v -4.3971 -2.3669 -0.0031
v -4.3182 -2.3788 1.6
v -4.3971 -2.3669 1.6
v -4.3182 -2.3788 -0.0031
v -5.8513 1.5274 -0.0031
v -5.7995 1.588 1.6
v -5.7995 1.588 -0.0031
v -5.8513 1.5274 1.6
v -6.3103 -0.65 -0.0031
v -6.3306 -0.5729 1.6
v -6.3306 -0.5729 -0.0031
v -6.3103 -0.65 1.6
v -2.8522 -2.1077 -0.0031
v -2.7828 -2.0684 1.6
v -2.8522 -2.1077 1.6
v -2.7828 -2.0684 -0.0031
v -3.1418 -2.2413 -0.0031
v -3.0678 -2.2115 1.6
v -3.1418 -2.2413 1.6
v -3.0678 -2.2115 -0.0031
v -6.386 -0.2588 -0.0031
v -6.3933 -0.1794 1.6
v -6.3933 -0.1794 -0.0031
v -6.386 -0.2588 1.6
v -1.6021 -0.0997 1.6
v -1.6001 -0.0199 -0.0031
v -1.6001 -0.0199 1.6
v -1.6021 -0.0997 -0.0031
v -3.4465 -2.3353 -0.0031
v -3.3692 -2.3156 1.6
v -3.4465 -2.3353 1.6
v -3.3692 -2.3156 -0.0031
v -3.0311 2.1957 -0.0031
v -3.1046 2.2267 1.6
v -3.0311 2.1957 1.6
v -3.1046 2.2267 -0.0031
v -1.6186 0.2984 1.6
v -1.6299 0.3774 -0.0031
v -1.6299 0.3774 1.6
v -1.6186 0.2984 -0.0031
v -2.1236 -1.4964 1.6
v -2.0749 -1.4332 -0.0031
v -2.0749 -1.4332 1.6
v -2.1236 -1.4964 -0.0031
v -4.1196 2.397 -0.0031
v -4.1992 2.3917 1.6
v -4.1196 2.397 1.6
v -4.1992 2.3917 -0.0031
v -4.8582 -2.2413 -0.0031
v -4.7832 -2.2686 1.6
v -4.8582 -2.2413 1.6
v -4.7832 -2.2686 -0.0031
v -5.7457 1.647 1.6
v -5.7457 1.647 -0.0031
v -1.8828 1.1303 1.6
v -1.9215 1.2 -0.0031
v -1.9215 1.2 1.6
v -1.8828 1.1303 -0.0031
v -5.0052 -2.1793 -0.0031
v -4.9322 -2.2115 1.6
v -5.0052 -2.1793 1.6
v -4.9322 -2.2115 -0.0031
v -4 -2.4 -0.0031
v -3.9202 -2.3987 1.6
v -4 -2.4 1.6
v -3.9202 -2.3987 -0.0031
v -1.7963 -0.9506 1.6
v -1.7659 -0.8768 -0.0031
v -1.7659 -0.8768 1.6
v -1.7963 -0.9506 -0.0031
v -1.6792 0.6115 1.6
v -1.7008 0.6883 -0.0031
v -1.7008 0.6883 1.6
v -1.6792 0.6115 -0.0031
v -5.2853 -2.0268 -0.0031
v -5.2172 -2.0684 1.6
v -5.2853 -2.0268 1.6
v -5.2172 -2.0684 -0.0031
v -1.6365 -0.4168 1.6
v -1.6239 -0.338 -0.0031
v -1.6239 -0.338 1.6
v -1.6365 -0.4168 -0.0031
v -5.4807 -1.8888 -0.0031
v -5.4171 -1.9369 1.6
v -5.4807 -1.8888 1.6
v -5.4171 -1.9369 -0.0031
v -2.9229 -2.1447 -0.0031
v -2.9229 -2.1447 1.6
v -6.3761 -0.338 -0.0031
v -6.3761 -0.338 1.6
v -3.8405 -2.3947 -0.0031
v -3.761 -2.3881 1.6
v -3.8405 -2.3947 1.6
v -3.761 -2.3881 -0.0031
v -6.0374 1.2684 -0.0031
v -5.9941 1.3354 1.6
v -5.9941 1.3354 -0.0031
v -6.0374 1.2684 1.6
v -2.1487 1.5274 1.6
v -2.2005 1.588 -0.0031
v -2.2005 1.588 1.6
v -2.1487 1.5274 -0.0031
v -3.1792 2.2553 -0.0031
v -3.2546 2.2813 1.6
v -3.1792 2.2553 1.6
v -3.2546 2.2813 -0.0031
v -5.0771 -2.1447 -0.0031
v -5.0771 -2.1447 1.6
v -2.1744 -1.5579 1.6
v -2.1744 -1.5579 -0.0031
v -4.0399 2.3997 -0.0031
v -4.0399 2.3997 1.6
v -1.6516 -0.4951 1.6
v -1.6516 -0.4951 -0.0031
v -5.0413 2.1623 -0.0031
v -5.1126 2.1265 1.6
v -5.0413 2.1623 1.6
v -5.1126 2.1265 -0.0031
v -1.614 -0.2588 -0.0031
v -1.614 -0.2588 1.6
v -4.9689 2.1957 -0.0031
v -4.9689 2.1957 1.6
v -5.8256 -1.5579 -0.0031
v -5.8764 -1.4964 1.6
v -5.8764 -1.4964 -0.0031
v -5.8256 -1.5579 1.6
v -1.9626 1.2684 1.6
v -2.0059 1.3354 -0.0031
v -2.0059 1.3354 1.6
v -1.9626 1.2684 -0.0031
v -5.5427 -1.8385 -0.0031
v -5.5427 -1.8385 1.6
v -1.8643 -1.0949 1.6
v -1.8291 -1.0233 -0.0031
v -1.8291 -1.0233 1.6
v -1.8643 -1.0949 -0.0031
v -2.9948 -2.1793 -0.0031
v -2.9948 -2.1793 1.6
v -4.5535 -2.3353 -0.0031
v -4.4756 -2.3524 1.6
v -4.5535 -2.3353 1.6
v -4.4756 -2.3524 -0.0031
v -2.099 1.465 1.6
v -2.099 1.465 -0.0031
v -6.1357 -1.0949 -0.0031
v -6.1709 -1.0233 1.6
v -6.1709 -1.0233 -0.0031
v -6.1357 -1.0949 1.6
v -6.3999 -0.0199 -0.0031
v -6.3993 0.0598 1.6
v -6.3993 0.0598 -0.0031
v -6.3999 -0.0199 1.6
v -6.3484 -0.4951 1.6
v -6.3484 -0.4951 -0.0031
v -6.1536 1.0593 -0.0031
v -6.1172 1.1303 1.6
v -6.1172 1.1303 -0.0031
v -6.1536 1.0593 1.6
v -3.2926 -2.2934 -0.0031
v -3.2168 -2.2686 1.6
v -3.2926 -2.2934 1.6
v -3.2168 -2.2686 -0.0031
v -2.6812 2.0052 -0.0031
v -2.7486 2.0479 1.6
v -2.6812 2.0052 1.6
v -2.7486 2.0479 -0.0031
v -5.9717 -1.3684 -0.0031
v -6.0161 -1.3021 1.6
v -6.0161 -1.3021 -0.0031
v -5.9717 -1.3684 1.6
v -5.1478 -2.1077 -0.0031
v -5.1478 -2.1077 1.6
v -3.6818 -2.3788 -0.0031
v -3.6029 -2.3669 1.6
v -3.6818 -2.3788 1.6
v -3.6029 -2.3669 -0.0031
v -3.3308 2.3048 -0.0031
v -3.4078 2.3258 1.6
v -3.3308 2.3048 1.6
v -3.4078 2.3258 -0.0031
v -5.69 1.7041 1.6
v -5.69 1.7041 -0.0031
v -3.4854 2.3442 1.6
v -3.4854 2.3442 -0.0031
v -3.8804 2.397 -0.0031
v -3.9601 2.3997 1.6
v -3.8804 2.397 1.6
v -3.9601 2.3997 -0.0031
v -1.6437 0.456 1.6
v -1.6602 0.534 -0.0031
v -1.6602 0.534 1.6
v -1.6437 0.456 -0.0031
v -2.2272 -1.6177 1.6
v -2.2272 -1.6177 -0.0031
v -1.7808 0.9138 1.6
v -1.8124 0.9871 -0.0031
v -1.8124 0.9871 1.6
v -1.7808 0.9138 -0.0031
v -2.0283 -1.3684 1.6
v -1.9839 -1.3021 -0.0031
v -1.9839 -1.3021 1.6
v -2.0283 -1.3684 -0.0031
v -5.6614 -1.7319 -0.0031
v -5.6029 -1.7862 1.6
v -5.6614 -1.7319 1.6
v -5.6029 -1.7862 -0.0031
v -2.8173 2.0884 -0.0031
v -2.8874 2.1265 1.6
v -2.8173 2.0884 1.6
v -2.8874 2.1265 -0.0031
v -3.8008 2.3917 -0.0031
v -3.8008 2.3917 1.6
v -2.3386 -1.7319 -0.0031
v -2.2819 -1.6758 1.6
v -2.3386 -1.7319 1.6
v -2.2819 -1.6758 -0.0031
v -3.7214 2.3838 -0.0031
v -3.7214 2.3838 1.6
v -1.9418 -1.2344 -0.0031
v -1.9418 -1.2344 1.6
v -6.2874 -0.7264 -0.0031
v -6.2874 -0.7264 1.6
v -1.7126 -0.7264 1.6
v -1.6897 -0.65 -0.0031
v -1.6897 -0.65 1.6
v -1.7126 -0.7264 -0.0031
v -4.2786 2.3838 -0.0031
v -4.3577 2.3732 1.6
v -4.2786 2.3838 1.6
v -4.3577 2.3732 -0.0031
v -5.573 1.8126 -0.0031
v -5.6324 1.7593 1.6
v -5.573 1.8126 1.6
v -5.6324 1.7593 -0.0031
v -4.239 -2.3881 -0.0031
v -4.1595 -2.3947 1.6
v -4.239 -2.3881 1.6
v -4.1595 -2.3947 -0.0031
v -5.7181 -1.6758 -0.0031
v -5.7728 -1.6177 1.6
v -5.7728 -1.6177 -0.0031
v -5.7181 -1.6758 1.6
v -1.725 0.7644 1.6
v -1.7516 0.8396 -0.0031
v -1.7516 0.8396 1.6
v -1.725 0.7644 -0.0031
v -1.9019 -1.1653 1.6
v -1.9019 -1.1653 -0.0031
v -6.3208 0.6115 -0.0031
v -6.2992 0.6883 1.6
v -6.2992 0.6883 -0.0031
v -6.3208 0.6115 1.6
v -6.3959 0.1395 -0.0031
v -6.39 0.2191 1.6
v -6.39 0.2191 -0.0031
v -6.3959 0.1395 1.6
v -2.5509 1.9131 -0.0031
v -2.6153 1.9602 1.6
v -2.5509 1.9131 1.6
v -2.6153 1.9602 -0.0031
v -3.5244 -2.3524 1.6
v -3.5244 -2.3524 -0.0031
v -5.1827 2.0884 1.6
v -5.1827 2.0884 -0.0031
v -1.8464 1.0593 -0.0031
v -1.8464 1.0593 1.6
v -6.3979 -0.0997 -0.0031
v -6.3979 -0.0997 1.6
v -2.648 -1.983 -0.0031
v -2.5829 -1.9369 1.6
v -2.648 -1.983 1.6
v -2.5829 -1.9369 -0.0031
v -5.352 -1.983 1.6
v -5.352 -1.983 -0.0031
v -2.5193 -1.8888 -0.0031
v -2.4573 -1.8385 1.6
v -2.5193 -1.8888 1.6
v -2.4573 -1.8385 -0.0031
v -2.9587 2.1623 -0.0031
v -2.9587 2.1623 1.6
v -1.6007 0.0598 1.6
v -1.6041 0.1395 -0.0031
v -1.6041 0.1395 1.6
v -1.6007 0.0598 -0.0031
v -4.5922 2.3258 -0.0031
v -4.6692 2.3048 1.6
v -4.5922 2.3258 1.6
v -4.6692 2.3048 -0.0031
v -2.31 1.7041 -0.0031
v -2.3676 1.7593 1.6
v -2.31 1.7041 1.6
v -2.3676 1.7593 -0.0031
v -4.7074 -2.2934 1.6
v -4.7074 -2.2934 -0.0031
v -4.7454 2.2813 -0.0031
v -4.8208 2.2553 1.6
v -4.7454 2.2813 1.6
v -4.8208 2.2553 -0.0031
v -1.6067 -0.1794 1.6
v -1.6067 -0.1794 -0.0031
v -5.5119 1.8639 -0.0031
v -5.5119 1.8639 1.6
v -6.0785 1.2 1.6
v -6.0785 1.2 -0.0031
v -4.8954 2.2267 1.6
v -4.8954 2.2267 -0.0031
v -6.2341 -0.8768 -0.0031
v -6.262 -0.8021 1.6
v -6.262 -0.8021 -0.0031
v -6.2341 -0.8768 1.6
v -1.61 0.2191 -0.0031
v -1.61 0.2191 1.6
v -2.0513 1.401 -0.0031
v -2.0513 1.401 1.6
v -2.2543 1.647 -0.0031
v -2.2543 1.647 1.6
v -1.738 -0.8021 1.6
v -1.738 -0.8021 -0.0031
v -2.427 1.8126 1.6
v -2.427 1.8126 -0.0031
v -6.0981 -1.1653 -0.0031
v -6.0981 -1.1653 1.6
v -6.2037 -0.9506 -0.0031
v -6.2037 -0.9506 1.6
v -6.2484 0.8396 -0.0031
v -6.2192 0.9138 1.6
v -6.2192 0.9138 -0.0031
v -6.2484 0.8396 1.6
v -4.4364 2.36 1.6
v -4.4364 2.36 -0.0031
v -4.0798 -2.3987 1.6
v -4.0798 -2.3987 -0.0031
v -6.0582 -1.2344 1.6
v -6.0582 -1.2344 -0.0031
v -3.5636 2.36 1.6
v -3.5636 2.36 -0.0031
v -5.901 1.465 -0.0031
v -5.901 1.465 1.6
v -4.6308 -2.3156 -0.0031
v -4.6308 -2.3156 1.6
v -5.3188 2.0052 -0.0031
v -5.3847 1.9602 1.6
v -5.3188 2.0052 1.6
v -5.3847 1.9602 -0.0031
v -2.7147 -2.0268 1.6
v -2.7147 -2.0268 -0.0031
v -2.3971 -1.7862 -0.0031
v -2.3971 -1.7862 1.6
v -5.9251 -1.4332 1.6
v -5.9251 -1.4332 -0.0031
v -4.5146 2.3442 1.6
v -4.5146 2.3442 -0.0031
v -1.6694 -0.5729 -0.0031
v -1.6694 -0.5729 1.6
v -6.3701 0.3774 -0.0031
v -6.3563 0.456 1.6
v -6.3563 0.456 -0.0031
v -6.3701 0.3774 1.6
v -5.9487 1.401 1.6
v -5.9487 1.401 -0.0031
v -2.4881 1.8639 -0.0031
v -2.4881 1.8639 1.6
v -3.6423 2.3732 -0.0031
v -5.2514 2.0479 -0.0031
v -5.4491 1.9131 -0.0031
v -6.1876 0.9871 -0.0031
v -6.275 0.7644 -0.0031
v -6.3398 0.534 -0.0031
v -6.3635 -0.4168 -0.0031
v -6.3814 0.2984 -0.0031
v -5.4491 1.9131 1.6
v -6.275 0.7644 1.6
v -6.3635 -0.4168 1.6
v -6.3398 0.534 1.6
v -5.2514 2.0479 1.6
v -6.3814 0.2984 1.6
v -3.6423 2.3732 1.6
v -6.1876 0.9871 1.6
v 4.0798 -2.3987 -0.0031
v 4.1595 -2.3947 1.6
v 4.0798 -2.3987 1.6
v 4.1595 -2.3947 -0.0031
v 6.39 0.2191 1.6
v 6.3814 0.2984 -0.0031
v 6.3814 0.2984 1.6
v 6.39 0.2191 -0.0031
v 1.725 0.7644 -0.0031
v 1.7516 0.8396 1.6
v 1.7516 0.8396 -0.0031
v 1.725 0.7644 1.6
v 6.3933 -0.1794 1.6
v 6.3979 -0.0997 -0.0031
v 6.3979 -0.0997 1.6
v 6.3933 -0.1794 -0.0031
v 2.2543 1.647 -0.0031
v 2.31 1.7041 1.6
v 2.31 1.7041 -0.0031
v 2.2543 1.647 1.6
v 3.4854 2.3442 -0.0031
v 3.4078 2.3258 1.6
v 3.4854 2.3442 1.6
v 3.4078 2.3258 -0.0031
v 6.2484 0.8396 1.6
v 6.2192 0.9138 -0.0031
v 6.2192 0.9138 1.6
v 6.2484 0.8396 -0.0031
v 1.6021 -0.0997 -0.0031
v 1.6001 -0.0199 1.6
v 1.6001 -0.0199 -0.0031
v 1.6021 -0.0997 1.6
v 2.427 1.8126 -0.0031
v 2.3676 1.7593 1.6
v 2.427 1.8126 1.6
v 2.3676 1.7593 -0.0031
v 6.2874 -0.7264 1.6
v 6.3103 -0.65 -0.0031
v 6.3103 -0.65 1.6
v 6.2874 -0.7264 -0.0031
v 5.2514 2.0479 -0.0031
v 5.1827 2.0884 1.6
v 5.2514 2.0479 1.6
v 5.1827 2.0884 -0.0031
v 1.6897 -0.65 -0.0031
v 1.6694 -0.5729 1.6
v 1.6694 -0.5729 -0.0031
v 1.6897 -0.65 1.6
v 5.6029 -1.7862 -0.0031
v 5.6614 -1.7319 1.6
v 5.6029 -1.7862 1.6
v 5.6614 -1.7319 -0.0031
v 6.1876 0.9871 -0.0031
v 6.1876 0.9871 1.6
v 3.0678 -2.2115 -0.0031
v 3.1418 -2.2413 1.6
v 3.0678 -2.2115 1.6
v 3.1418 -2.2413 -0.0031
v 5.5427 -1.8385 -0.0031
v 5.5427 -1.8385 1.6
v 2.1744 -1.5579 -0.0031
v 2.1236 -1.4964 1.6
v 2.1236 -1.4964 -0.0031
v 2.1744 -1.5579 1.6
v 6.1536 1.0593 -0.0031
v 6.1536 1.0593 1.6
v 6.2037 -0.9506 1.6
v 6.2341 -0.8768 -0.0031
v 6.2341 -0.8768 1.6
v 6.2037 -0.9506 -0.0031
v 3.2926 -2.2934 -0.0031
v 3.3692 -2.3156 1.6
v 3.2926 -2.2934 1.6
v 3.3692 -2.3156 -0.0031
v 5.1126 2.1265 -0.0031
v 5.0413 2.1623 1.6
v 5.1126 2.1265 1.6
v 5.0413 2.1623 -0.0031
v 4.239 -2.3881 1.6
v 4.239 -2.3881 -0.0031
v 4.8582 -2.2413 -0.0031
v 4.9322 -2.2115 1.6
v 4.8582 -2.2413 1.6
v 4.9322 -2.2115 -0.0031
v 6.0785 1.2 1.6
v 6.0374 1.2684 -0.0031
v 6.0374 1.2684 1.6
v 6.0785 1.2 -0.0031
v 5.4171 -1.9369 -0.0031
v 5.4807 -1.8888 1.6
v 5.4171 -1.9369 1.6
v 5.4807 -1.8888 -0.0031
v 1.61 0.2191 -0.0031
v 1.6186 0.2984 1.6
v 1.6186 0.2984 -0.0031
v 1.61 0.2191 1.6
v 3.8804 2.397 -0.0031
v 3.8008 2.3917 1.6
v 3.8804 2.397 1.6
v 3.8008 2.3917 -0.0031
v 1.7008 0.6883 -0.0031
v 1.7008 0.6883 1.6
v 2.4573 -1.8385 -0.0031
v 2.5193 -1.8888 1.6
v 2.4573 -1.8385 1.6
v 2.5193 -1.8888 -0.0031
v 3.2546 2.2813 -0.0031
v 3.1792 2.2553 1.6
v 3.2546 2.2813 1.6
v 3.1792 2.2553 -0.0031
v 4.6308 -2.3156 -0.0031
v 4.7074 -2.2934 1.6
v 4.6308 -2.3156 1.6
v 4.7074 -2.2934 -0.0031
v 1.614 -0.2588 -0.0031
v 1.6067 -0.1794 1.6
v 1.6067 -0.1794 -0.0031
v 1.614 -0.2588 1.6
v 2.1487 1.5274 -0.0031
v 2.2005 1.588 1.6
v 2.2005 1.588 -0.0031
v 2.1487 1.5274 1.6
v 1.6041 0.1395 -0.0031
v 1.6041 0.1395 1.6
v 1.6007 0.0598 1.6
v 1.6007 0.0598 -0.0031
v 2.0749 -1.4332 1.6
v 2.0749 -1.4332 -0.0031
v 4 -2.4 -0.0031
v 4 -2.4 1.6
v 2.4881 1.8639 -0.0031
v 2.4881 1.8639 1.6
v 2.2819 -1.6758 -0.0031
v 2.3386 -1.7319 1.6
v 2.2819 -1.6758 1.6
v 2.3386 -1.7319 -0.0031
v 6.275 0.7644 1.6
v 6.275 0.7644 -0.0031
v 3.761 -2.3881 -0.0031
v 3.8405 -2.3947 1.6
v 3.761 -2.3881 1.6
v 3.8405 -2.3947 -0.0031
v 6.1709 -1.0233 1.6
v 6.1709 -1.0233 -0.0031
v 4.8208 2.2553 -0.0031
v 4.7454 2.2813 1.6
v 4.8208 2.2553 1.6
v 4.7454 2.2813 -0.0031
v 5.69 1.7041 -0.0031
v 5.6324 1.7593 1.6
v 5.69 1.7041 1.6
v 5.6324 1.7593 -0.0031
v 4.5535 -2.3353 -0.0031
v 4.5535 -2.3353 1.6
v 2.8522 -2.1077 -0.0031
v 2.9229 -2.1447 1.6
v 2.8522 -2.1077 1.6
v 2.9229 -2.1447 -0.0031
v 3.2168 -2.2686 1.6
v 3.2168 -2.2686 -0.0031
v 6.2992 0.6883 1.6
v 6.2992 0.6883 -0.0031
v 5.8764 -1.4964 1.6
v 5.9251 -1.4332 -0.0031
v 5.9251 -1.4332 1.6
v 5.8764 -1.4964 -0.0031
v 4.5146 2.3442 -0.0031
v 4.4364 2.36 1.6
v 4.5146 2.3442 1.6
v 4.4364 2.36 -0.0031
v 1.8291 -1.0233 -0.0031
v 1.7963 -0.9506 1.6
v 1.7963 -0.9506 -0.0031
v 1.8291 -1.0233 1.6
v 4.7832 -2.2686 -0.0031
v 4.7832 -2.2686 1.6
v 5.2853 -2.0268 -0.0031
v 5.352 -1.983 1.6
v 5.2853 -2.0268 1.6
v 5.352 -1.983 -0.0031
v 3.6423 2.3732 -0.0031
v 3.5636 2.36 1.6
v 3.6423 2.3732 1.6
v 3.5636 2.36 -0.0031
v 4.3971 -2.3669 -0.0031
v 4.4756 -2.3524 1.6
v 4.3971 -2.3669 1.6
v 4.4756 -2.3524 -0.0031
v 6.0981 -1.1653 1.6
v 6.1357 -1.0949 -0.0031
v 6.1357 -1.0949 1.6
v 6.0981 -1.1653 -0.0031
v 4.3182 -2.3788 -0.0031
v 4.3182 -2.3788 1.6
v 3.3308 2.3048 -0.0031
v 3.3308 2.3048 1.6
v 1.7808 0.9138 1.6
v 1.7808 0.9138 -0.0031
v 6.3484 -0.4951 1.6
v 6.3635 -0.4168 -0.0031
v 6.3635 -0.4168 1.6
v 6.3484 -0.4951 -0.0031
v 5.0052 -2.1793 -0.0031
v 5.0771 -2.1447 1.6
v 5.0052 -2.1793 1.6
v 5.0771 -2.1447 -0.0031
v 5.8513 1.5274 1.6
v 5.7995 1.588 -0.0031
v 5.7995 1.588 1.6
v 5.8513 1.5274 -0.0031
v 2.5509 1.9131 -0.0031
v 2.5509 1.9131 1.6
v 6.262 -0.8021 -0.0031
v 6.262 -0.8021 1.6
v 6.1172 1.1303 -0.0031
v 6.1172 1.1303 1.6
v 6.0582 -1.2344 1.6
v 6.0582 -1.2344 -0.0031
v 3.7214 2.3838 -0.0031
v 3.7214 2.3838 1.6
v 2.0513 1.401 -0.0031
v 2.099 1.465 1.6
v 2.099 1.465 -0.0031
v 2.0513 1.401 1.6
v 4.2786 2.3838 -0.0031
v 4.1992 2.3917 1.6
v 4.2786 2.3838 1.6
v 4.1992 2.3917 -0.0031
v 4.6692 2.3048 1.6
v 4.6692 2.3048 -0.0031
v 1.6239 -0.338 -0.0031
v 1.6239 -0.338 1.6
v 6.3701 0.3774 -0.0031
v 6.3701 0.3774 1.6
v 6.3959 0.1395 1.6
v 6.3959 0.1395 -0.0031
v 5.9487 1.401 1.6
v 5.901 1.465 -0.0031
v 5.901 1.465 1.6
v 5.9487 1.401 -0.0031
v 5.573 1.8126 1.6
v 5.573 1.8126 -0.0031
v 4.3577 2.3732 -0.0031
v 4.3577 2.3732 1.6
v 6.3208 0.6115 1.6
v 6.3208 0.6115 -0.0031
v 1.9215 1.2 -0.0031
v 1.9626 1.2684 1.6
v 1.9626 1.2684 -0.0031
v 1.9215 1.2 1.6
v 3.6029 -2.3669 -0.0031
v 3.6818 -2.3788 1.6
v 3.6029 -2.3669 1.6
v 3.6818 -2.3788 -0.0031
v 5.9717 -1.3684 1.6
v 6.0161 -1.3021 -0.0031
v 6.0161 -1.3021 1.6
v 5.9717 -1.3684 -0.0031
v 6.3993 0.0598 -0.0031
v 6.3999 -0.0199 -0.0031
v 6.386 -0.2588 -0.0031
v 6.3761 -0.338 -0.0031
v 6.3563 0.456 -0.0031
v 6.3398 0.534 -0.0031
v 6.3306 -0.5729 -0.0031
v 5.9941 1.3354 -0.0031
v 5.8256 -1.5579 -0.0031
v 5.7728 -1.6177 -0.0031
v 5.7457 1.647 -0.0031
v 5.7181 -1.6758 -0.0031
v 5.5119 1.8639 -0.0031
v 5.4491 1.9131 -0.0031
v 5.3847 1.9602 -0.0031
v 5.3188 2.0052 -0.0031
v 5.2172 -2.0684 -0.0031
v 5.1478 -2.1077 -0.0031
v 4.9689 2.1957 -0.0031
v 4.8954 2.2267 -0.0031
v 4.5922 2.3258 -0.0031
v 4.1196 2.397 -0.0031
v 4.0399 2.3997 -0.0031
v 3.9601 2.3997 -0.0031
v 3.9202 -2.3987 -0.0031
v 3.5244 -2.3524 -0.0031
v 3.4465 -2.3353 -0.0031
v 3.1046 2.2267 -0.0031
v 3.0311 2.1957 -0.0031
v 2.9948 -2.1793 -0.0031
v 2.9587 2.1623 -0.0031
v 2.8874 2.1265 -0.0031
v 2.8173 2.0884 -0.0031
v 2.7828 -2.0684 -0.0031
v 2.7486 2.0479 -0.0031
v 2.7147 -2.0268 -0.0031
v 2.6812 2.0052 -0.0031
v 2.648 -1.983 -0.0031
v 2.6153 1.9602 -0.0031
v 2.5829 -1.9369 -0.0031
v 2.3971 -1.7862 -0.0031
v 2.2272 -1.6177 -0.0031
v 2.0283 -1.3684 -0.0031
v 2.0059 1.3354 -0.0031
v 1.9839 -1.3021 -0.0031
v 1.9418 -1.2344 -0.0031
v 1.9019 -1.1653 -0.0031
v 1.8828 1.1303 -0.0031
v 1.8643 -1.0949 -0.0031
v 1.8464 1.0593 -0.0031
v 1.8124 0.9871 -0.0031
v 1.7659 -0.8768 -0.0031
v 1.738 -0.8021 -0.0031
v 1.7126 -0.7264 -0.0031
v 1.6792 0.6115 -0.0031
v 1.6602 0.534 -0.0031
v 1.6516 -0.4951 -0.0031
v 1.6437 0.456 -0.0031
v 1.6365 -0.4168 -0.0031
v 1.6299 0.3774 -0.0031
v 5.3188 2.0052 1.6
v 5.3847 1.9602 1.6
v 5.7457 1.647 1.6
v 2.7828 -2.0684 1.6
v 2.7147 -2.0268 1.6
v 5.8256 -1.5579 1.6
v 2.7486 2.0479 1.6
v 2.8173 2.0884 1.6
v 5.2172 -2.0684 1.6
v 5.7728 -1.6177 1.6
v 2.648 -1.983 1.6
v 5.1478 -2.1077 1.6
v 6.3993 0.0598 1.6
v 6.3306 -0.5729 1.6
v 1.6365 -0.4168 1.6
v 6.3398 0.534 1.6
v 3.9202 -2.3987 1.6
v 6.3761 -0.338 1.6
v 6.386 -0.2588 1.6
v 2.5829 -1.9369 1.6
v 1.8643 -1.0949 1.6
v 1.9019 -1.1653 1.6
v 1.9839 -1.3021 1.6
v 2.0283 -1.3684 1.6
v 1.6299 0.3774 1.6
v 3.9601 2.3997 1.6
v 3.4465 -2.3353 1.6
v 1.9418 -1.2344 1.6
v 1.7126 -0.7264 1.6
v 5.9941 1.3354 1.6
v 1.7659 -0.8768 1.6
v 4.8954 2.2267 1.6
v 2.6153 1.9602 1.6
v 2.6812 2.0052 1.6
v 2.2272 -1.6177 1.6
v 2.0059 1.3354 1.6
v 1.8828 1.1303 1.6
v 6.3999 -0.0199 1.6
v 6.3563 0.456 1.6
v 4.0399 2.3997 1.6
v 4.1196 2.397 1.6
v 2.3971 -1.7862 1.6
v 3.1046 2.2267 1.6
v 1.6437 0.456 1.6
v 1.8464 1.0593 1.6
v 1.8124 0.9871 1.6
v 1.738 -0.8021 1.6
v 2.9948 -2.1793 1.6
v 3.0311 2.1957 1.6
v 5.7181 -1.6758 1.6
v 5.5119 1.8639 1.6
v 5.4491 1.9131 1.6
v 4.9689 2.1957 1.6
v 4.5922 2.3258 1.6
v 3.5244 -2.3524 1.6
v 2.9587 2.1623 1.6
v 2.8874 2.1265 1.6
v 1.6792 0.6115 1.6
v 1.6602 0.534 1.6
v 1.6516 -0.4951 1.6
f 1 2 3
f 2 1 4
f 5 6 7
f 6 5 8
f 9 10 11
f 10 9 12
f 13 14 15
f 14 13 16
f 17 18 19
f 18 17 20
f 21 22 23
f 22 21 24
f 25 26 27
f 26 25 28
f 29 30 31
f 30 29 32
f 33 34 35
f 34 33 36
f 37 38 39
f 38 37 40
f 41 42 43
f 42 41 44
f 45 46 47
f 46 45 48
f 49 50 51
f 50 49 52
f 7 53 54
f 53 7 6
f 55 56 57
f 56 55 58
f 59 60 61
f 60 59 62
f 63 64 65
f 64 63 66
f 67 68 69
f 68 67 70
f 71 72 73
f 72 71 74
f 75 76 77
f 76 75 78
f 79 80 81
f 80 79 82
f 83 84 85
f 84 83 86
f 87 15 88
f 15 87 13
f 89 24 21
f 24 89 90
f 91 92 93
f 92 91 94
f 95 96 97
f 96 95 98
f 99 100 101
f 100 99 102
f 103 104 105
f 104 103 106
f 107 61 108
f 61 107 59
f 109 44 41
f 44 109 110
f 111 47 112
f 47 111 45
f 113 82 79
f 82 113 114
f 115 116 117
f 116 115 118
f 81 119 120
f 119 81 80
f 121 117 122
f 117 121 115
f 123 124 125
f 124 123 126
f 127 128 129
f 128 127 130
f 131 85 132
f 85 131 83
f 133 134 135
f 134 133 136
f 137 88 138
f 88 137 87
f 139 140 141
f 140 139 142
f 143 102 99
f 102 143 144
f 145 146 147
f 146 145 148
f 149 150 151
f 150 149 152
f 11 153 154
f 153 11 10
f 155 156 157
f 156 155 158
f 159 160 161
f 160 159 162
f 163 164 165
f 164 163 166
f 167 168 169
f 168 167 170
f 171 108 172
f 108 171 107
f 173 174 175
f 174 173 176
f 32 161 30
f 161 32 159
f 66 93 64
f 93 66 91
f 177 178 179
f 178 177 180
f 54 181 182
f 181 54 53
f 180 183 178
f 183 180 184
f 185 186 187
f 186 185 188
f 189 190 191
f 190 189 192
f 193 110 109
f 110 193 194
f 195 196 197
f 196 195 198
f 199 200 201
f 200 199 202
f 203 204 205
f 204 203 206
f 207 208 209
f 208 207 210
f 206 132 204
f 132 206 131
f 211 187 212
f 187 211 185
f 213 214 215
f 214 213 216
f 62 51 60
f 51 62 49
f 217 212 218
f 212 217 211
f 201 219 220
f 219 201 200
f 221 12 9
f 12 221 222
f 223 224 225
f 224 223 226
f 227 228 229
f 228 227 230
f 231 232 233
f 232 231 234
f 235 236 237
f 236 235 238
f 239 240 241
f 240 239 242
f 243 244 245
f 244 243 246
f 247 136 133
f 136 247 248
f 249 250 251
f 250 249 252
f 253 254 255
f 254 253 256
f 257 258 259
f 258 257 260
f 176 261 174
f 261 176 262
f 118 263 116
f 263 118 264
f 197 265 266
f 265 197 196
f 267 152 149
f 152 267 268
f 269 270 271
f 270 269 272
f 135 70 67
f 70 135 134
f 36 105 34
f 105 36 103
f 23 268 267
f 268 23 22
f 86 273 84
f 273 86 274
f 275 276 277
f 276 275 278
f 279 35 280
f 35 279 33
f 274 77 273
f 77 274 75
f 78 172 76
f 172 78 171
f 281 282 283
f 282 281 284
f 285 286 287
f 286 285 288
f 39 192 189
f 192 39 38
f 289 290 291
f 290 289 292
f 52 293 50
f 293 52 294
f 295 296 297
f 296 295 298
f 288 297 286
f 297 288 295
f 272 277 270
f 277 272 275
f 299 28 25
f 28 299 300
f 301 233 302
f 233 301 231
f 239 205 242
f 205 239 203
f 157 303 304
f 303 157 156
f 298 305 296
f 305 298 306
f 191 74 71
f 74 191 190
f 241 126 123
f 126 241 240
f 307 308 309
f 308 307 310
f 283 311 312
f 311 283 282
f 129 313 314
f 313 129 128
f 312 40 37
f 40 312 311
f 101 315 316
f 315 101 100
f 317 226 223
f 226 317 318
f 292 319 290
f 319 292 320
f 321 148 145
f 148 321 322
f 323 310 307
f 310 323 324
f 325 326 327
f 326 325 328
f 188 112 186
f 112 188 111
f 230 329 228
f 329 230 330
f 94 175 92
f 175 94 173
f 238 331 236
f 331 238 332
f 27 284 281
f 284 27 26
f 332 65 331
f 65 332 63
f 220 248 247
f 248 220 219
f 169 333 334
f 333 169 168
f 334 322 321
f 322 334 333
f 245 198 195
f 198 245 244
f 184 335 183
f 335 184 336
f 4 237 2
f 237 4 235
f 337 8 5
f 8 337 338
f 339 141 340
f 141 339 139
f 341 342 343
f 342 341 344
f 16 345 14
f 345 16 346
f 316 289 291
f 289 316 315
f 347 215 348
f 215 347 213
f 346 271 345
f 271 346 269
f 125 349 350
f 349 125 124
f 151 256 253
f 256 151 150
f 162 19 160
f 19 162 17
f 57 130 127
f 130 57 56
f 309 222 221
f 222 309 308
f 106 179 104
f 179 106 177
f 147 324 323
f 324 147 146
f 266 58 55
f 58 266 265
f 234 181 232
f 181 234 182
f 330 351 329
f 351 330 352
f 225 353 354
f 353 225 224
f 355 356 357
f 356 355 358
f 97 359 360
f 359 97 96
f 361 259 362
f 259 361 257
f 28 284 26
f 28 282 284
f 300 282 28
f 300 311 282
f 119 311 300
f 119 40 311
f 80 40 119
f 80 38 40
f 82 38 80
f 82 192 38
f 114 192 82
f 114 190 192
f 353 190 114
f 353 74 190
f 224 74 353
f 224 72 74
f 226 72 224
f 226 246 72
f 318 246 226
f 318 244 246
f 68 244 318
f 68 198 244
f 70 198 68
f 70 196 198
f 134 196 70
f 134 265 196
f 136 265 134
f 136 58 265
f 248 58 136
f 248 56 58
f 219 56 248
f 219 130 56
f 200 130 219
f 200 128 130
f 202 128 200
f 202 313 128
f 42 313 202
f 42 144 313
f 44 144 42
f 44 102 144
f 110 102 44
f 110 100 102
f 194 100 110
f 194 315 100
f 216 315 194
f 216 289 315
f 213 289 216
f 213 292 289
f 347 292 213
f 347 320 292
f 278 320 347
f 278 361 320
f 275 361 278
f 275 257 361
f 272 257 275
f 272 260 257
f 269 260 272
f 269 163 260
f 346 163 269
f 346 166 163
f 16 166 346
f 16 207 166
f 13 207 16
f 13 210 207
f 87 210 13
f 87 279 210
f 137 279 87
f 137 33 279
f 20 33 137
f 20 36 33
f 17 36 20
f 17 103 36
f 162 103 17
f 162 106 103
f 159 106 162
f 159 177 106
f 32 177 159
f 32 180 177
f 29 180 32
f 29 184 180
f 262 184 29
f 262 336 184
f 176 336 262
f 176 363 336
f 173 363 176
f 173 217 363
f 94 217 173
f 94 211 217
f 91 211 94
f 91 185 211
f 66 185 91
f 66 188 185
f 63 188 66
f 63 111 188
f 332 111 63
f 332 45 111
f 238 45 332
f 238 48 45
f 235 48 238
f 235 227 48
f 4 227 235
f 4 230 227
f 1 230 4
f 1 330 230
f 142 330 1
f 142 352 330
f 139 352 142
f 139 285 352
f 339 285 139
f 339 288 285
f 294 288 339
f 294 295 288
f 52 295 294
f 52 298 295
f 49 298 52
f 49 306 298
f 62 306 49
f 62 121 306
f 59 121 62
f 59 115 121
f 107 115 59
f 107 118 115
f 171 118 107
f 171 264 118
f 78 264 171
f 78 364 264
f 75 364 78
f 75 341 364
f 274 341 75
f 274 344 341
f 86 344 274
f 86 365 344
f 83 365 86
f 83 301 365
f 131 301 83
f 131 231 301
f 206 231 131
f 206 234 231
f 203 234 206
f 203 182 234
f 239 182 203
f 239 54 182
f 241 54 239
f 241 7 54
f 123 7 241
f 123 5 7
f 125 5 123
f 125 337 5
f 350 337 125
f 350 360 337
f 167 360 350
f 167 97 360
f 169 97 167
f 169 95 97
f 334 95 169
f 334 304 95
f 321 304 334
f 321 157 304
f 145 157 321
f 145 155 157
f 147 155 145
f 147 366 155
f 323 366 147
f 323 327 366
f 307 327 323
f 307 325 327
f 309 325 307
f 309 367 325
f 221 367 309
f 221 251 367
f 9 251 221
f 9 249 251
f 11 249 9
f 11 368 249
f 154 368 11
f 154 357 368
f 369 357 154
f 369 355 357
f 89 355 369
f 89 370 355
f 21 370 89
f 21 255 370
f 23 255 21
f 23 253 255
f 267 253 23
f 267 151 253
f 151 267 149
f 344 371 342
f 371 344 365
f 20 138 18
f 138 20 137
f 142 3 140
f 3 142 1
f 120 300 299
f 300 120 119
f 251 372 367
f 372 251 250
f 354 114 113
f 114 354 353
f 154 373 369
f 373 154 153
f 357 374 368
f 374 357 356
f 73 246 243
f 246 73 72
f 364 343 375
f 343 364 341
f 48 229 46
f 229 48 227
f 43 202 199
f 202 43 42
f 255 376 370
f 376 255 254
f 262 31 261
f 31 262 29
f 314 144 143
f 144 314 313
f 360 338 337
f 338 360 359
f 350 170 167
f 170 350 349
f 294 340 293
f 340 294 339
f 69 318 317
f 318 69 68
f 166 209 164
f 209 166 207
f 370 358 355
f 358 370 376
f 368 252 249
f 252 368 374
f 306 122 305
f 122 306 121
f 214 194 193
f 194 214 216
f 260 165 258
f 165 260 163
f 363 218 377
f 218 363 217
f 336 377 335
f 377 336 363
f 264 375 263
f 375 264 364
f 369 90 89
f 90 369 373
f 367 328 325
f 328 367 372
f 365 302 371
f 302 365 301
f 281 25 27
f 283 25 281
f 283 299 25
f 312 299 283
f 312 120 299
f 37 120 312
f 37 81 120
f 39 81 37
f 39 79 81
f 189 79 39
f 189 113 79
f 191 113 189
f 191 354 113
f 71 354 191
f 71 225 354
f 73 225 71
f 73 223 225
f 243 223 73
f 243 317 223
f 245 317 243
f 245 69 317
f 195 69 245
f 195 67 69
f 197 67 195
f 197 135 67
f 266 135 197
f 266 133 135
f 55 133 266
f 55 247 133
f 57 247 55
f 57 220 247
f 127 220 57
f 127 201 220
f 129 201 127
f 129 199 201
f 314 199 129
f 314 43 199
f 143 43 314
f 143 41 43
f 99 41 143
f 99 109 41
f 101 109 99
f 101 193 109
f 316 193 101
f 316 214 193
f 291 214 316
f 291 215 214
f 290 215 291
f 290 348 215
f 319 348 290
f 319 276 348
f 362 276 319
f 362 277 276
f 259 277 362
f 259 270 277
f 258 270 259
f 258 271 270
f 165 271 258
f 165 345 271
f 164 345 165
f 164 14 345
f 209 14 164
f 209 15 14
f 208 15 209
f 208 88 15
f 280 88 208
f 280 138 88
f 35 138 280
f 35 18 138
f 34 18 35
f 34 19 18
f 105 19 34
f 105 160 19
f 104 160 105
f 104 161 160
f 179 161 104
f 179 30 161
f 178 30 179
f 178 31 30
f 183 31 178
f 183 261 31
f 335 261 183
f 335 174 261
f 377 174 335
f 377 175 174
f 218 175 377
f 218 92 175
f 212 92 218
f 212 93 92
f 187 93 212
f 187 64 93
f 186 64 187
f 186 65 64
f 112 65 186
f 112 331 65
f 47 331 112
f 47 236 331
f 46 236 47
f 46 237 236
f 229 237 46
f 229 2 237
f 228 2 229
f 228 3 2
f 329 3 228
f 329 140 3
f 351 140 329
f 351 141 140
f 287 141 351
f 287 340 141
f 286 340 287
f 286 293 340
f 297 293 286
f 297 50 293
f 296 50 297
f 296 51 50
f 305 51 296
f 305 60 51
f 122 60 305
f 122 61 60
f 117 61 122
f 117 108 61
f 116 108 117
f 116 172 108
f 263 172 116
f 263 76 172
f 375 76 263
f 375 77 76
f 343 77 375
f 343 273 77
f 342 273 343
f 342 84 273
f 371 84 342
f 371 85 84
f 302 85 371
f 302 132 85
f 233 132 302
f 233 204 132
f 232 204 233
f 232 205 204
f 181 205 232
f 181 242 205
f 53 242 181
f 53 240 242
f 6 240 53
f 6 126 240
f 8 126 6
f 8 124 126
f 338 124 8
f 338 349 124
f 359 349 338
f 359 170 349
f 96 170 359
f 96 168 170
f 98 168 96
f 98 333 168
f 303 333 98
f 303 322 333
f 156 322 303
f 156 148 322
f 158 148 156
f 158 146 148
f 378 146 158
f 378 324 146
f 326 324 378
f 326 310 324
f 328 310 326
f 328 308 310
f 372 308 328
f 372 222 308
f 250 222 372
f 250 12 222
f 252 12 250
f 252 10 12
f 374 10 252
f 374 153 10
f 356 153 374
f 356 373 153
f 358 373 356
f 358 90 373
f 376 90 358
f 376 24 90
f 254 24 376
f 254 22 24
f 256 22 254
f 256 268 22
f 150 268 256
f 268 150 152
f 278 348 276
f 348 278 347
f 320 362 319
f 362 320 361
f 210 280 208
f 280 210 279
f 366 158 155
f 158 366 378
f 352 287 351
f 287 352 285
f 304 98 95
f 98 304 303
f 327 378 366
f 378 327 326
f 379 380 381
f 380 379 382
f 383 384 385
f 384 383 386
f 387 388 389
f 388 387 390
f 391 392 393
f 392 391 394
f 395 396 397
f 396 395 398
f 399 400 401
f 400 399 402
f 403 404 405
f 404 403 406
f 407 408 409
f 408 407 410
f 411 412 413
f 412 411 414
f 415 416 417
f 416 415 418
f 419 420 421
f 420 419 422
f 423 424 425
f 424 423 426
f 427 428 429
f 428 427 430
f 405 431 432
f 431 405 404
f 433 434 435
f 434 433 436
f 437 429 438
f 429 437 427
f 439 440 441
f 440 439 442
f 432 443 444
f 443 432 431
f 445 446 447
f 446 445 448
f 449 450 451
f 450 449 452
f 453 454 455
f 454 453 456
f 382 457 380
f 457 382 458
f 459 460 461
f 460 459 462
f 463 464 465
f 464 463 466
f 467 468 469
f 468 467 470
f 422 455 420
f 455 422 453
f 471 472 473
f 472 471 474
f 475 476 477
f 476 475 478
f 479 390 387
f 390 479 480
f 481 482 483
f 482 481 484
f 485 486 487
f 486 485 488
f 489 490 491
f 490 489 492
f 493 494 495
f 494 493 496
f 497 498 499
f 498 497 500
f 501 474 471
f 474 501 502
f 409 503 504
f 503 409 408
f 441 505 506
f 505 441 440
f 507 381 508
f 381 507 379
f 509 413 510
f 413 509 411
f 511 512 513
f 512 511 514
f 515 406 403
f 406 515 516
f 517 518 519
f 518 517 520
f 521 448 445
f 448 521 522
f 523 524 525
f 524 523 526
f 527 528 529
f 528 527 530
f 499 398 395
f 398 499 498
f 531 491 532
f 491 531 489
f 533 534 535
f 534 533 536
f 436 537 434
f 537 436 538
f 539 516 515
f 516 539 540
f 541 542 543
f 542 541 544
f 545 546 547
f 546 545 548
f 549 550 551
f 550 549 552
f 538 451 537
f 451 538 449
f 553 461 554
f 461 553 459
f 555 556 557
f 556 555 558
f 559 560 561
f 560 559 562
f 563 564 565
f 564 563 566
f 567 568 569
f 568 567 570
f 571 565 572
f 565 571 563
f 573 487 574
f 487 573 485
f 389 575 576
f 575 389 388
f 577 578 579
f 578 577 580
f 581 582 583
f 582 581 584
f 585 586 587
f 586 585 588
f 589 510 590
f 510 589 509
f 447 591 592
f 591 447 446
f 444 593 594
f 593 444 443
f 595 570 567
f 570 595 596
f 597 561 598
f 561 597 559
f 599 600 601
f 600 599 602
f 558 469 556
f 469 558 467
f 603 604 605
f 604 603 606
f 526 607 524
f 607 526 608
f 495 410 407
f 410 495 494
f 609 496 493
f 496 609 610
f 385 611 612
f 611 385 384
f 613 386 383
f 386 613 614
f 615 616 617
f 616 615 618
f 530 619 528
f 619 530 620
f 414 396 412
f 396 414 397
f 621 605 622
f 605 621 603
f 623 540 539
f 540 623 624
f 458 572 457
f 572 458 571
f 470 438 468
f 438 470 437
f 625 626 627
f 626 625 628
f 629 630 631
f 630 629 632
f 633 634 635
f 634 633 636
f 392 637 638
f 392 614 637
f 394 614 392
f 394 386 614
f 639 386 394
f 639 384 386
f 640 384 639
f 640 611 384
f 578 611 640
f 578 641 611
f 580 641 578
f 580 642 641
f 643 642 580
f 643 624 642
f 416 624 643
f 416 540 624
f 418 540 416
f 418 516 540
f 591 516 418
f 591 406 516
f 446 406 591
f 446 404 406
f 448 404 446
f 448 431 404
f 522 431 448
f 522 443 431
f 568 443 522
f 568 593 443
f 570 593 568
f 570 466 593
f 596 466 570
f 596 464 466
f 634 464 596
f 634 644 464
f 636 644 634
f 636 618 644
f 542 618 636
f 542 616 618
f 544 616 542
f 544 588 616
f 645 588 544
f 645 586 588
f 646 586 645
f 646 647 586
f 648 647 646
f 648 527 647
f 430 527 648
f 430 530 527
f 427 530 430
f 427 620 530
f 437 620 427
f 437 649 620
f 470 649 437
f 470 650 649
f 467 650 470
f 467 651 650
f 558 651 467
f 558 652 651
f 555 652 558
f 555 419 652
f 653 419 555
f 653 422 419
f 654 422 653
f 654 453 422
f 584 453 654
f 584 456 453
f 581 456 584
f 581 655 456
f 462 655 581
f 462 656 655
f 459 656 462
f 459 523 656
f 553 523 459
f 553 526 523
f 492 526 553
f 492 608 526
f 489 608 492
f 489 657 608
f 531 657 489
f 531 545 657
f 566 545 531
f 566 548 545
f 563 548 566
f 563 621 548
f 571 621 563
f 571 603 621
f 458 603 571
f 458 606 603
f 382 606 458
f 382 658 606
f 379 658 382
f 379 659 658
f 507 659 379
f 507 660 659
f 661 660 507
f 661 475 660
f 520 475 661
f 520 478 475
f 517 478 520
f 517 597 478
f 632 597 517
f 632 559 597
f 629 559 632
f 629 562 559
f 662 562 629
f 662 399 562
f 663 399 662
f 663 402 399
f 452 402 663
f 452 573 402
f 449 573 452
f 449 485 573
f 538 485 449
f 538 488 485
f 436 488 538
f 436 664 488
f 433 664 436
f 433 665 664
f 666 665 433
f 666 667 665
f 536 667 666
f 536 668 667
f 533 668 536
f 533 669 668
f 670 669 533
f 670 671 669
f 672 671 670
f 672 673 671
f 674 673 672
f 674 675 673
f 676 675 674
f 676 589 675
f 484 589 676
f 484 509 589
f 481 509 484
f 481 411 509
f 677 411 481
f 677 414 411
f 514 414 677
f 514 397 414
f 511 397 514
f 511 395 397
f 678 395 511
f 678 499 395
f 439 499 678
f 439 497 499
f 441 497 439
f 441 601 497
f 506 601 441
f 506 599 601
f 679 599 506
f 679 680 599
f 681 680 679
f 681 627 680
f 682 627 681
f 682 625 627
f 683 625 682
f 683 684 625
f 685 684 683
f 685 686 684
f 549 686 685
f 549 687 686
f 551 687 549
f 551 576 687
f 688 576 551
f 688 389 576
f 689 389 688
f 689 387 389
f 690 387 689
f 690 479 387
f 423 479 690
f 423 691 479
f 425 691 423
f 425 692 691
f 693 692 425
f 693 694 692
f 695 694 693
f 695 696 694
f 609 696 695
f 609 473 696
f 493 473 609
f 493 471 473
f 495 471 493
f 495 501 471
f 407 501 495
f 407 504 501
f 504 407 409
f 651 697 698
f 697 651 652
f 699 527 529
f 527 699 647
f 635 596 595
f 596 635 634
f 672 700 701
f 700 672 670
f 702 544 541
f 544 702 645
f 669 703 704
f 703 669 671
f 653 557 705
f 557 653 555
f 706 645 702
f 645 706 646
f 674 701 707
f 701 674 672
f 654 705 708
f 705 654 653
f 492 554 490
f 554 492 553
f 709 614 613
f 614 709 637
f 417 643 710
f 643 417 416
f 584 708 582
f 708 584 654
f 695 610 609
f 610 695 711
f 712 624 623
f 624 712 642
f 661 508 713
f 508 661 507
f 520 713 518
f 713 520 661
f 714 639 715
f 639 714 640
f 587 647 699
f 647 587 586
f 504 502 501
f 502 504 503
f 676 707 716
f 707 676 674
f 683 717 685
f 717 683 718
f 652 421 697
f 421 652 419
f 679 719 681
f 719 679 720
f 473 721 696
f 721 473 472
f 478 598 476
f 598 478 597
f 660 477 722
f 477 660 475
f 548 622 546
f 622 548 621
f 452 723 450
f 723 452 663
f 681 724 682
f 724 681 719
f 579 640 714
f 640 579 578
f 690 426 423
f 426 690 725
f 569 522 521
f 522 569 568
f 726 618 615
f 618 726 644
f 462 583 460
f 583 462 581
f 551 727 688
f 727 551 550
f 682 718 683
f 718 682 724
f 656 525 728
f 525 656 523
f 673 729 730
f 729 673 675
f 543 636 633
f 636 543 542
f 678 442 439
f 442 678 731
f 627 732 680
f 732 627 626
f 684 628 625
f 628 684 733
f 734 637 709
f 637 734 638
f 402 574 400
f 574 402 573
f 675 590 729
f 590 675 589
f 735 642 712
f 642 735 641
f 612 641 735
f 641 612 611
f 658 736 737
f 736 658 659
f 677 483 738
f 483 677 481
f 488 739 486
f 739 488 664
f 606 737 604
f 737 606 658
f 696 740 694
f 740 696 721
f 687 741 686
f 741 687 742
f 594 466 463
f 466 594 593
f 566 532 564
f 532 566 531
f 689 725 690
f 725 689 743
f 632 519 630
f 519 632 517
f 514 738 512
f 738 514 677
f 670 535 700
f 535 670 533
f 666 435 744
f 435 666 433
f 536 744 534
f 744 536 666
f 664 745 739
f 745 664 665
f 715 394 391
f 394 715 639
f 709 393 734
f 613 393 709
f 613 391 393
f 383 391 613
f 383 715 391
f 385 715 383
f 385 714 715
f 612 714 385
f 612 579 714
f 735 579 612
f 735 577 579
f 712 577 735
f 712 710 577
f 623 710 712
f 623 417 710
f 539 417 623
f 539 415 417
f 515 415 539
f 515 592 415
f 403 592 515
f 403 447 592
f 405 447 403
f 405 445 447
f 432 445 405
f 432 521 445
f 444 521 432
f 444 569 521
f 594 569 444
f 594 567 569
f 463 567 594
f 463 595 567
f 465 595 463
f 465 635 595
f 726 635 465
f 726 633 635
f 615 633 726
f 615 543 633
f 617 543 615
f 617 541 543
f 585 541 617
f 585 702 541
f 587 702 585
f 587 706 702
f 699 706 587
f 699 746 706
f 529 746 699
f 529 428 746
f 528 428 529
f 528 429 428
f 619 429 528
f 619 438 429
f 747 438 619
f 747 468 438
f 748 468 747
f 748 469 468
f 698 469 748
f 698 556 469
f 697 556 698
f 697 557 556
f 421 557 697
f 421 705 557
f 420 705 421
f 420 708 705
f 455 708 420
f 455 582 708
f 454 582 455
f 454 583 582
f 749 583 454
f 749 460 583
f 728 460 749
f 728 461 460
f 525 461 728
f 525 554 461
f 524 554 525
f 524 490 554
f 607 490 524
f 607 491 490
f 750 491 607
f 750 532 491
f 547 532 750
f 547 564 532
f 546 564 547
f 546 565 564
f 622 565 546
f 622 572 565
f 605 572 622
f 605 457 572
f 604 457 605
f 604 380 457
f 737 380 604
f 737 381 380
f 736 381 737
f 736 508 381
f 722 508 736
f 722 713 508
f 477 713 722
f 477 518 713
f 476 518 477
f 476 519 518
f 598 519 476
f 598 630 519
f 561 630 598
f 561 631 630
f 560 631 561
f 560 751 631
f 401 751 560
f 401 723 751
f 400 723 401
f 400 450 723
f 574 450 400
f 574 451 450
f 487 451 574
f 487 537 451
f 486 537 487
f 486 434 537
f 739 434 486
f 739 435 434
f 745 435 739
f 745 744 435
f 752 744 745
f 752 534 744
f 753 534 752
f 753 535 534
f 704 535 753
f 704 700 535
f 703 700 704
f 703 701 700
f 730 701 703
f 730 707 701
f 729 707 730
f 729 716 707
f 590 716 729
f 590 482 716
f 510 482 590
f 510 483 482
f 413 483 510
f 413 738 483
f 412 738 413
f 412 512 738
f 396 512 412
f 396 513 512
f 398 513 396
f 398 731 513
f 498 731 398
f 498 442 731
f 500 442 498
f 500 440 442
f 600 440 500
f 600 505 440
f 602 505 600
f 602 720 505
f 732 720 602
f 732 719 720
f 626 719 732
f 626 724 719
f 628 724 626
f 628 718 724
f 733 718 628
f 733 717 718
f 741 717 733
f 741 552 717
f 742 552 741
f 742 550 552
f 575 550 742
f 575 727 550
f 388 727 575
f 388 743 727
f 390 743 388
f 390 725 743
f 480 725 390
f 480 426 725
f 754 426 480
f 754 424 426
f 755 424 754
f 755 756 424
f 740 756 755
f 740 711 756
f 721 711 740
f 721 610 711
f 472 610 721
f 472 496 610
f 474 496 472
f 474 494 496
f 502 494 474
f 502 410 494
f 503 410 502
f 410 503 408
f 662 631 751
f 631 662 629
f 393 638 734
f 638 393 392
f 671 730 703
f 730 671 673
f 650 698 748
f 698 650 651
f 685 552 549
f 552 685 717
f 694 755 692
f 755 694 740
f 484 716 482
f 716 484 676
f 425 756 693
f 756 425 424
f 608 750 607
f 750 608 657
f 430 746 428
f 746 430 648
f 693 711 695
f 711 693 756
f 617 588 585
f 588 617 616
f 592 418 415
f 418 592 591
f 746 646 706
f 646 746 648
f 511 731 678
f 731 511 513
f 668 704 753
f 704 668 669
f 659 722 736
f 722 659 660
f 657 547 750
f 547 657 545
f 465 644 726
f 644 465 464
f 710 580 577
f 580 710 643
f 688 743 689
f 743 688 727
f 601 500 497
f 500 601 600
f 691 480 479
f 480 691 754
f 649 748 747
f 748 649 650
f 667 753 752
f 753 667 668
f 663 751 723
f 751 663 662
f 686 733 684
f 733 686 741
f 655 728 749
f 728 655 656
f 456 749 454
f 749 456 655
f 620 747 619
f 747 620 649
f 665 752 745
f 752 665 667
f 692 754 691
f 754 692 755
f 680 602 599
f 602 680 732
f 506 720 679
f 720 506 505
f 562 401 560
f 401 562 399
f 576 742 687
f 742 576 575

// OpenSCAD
use <../lib.scad>
use <3039.scad>
$fa=1; $fs=0.2;
function ldraw_lib__6227(realsolid=false) = [
// 0 =Slope Brick 45  2 x  2
// 0 Name: 6227.dat
// 0 Author: Rolf Osterthun [Rolf]
// 0 !LDRAW_ORG Part Alias UPDATE 2013-02
// 0 !LICENSE Licensed under CC BY 2.0 and CC BY 4.0 : see CAreadme.txt
// 
// 0 BFC CERTIFY CCW
  [0,"BFC","CERTIFY"],
  [0,"BFC","CCW"],
// 
// 0 !HISTORY 2013-12-23 [PTadmin] Official Update 2013-02
// 
// 
// 0 // Alias of 3039
// 0 // Part 6227 is the transparent counterpart of 3039
// 
// 1 16 0 0 0 1 0 0 0 1 0 0 0 1 3039.dat
  [1,16,0,0,0,1,0,0,0,1,0,0,0,1, ldraw_lib__3039(realsolid)],
];
module ldraw_lib__6227(step=0, col=false, unit=2/5, alt=false, line=0.2, solid=!$preview)
    makepoly(ldraw_lib__6227(solid), step=step, col=col, unit=unit, alt=alt, line=line, solid=solid);
ldraw_lib__6227(line=0.2);
